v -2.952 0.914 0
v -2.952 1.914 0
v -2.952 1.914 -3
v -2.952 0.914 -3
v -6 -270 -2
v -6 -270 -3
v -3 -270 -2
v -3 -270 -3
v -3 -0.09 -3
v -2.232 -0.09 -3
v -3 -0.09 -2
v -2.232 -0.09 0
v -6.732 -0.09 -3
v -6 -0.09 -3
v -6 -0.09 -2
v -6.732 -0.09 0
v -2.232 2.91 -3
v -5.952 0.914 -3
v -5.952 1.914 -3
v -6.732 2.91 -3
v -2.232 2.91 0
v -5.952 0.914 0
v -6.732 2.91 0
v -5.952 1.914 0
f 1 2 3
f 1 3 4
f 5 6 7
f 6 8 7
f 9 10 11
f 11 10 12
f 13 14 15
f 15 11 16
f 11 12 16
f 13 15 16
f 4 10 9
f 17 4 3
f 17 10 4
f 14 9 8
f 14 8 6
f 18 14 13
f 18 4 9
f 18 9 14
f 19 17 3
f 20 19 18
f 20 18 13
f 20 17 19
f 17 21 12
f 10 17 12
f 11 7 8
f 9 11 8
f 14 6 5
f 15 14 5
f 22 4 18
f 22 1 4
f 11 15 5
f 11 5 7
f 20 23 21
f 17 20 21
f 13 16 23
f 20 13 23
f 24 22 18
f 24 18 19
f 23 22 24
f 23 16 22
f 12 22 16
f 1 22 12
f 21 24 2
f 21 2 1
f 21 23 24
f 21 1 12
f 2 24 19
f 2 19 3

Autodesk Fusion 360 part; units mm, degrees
sketch "Sketch1" plane through (0, 0, 0) normal (1, 0, 0) x (0, 0, -1)
  line L0 (0, -270) -> (0, 0)
  dimension "d15" = 270
sketch "Sketch2" plane through (0, 0, 0) normal (0, 1, 0) x (1, 0, 0)
  line L0 (-6, 3) -> (-3, 3)
  line L1 (-3, 3) -> (-3, 2)
  line L2 (-3, 2) -> (-6, 2)
  line L3 (-6, 2) -> (-6, 3)
  dimension "d1" = 1
  dimension "d2" = 3
sweep "Sweep1" add profiles "Sketch2" path "Sketch1" along L0 section 1
sketch "Sketch3" plane through (0, 0, 0) normal (0, 0, 1) x (1, 0, 0)
  line L0 (-6.7324, 2.9105) -> (-2.2324, 2.9105)
  line L1 (-2.2324, 2.9105) -> (-2.2324, -0.0895)
  line L2 (-2.2324, -0.0895) -> (-6.7324, -0.0895)
  line L3 (-6.7324, -0.0895) -> (-6.7324, 2.9105)
  line L4 (-5.9523, 1.9141) -> (-2.9523, 1.9141)
  line L5 (-2.9523, 1.9141) -> (-2.9523, 0.9141)
  line L6 (-2.9523, 0.9141) -> (-5.9523, 0.9141)
  line L7 (-5.9523, 0.9141) -> (-5.9523, 1.9141)
  dimension "d9" = 3
  dimension "d10" = 1
  dimension "d11" = 3
  dimension "d12" = 4.5
extrude "Extrude1" add sketch "Sketch3" against normal blind 3
